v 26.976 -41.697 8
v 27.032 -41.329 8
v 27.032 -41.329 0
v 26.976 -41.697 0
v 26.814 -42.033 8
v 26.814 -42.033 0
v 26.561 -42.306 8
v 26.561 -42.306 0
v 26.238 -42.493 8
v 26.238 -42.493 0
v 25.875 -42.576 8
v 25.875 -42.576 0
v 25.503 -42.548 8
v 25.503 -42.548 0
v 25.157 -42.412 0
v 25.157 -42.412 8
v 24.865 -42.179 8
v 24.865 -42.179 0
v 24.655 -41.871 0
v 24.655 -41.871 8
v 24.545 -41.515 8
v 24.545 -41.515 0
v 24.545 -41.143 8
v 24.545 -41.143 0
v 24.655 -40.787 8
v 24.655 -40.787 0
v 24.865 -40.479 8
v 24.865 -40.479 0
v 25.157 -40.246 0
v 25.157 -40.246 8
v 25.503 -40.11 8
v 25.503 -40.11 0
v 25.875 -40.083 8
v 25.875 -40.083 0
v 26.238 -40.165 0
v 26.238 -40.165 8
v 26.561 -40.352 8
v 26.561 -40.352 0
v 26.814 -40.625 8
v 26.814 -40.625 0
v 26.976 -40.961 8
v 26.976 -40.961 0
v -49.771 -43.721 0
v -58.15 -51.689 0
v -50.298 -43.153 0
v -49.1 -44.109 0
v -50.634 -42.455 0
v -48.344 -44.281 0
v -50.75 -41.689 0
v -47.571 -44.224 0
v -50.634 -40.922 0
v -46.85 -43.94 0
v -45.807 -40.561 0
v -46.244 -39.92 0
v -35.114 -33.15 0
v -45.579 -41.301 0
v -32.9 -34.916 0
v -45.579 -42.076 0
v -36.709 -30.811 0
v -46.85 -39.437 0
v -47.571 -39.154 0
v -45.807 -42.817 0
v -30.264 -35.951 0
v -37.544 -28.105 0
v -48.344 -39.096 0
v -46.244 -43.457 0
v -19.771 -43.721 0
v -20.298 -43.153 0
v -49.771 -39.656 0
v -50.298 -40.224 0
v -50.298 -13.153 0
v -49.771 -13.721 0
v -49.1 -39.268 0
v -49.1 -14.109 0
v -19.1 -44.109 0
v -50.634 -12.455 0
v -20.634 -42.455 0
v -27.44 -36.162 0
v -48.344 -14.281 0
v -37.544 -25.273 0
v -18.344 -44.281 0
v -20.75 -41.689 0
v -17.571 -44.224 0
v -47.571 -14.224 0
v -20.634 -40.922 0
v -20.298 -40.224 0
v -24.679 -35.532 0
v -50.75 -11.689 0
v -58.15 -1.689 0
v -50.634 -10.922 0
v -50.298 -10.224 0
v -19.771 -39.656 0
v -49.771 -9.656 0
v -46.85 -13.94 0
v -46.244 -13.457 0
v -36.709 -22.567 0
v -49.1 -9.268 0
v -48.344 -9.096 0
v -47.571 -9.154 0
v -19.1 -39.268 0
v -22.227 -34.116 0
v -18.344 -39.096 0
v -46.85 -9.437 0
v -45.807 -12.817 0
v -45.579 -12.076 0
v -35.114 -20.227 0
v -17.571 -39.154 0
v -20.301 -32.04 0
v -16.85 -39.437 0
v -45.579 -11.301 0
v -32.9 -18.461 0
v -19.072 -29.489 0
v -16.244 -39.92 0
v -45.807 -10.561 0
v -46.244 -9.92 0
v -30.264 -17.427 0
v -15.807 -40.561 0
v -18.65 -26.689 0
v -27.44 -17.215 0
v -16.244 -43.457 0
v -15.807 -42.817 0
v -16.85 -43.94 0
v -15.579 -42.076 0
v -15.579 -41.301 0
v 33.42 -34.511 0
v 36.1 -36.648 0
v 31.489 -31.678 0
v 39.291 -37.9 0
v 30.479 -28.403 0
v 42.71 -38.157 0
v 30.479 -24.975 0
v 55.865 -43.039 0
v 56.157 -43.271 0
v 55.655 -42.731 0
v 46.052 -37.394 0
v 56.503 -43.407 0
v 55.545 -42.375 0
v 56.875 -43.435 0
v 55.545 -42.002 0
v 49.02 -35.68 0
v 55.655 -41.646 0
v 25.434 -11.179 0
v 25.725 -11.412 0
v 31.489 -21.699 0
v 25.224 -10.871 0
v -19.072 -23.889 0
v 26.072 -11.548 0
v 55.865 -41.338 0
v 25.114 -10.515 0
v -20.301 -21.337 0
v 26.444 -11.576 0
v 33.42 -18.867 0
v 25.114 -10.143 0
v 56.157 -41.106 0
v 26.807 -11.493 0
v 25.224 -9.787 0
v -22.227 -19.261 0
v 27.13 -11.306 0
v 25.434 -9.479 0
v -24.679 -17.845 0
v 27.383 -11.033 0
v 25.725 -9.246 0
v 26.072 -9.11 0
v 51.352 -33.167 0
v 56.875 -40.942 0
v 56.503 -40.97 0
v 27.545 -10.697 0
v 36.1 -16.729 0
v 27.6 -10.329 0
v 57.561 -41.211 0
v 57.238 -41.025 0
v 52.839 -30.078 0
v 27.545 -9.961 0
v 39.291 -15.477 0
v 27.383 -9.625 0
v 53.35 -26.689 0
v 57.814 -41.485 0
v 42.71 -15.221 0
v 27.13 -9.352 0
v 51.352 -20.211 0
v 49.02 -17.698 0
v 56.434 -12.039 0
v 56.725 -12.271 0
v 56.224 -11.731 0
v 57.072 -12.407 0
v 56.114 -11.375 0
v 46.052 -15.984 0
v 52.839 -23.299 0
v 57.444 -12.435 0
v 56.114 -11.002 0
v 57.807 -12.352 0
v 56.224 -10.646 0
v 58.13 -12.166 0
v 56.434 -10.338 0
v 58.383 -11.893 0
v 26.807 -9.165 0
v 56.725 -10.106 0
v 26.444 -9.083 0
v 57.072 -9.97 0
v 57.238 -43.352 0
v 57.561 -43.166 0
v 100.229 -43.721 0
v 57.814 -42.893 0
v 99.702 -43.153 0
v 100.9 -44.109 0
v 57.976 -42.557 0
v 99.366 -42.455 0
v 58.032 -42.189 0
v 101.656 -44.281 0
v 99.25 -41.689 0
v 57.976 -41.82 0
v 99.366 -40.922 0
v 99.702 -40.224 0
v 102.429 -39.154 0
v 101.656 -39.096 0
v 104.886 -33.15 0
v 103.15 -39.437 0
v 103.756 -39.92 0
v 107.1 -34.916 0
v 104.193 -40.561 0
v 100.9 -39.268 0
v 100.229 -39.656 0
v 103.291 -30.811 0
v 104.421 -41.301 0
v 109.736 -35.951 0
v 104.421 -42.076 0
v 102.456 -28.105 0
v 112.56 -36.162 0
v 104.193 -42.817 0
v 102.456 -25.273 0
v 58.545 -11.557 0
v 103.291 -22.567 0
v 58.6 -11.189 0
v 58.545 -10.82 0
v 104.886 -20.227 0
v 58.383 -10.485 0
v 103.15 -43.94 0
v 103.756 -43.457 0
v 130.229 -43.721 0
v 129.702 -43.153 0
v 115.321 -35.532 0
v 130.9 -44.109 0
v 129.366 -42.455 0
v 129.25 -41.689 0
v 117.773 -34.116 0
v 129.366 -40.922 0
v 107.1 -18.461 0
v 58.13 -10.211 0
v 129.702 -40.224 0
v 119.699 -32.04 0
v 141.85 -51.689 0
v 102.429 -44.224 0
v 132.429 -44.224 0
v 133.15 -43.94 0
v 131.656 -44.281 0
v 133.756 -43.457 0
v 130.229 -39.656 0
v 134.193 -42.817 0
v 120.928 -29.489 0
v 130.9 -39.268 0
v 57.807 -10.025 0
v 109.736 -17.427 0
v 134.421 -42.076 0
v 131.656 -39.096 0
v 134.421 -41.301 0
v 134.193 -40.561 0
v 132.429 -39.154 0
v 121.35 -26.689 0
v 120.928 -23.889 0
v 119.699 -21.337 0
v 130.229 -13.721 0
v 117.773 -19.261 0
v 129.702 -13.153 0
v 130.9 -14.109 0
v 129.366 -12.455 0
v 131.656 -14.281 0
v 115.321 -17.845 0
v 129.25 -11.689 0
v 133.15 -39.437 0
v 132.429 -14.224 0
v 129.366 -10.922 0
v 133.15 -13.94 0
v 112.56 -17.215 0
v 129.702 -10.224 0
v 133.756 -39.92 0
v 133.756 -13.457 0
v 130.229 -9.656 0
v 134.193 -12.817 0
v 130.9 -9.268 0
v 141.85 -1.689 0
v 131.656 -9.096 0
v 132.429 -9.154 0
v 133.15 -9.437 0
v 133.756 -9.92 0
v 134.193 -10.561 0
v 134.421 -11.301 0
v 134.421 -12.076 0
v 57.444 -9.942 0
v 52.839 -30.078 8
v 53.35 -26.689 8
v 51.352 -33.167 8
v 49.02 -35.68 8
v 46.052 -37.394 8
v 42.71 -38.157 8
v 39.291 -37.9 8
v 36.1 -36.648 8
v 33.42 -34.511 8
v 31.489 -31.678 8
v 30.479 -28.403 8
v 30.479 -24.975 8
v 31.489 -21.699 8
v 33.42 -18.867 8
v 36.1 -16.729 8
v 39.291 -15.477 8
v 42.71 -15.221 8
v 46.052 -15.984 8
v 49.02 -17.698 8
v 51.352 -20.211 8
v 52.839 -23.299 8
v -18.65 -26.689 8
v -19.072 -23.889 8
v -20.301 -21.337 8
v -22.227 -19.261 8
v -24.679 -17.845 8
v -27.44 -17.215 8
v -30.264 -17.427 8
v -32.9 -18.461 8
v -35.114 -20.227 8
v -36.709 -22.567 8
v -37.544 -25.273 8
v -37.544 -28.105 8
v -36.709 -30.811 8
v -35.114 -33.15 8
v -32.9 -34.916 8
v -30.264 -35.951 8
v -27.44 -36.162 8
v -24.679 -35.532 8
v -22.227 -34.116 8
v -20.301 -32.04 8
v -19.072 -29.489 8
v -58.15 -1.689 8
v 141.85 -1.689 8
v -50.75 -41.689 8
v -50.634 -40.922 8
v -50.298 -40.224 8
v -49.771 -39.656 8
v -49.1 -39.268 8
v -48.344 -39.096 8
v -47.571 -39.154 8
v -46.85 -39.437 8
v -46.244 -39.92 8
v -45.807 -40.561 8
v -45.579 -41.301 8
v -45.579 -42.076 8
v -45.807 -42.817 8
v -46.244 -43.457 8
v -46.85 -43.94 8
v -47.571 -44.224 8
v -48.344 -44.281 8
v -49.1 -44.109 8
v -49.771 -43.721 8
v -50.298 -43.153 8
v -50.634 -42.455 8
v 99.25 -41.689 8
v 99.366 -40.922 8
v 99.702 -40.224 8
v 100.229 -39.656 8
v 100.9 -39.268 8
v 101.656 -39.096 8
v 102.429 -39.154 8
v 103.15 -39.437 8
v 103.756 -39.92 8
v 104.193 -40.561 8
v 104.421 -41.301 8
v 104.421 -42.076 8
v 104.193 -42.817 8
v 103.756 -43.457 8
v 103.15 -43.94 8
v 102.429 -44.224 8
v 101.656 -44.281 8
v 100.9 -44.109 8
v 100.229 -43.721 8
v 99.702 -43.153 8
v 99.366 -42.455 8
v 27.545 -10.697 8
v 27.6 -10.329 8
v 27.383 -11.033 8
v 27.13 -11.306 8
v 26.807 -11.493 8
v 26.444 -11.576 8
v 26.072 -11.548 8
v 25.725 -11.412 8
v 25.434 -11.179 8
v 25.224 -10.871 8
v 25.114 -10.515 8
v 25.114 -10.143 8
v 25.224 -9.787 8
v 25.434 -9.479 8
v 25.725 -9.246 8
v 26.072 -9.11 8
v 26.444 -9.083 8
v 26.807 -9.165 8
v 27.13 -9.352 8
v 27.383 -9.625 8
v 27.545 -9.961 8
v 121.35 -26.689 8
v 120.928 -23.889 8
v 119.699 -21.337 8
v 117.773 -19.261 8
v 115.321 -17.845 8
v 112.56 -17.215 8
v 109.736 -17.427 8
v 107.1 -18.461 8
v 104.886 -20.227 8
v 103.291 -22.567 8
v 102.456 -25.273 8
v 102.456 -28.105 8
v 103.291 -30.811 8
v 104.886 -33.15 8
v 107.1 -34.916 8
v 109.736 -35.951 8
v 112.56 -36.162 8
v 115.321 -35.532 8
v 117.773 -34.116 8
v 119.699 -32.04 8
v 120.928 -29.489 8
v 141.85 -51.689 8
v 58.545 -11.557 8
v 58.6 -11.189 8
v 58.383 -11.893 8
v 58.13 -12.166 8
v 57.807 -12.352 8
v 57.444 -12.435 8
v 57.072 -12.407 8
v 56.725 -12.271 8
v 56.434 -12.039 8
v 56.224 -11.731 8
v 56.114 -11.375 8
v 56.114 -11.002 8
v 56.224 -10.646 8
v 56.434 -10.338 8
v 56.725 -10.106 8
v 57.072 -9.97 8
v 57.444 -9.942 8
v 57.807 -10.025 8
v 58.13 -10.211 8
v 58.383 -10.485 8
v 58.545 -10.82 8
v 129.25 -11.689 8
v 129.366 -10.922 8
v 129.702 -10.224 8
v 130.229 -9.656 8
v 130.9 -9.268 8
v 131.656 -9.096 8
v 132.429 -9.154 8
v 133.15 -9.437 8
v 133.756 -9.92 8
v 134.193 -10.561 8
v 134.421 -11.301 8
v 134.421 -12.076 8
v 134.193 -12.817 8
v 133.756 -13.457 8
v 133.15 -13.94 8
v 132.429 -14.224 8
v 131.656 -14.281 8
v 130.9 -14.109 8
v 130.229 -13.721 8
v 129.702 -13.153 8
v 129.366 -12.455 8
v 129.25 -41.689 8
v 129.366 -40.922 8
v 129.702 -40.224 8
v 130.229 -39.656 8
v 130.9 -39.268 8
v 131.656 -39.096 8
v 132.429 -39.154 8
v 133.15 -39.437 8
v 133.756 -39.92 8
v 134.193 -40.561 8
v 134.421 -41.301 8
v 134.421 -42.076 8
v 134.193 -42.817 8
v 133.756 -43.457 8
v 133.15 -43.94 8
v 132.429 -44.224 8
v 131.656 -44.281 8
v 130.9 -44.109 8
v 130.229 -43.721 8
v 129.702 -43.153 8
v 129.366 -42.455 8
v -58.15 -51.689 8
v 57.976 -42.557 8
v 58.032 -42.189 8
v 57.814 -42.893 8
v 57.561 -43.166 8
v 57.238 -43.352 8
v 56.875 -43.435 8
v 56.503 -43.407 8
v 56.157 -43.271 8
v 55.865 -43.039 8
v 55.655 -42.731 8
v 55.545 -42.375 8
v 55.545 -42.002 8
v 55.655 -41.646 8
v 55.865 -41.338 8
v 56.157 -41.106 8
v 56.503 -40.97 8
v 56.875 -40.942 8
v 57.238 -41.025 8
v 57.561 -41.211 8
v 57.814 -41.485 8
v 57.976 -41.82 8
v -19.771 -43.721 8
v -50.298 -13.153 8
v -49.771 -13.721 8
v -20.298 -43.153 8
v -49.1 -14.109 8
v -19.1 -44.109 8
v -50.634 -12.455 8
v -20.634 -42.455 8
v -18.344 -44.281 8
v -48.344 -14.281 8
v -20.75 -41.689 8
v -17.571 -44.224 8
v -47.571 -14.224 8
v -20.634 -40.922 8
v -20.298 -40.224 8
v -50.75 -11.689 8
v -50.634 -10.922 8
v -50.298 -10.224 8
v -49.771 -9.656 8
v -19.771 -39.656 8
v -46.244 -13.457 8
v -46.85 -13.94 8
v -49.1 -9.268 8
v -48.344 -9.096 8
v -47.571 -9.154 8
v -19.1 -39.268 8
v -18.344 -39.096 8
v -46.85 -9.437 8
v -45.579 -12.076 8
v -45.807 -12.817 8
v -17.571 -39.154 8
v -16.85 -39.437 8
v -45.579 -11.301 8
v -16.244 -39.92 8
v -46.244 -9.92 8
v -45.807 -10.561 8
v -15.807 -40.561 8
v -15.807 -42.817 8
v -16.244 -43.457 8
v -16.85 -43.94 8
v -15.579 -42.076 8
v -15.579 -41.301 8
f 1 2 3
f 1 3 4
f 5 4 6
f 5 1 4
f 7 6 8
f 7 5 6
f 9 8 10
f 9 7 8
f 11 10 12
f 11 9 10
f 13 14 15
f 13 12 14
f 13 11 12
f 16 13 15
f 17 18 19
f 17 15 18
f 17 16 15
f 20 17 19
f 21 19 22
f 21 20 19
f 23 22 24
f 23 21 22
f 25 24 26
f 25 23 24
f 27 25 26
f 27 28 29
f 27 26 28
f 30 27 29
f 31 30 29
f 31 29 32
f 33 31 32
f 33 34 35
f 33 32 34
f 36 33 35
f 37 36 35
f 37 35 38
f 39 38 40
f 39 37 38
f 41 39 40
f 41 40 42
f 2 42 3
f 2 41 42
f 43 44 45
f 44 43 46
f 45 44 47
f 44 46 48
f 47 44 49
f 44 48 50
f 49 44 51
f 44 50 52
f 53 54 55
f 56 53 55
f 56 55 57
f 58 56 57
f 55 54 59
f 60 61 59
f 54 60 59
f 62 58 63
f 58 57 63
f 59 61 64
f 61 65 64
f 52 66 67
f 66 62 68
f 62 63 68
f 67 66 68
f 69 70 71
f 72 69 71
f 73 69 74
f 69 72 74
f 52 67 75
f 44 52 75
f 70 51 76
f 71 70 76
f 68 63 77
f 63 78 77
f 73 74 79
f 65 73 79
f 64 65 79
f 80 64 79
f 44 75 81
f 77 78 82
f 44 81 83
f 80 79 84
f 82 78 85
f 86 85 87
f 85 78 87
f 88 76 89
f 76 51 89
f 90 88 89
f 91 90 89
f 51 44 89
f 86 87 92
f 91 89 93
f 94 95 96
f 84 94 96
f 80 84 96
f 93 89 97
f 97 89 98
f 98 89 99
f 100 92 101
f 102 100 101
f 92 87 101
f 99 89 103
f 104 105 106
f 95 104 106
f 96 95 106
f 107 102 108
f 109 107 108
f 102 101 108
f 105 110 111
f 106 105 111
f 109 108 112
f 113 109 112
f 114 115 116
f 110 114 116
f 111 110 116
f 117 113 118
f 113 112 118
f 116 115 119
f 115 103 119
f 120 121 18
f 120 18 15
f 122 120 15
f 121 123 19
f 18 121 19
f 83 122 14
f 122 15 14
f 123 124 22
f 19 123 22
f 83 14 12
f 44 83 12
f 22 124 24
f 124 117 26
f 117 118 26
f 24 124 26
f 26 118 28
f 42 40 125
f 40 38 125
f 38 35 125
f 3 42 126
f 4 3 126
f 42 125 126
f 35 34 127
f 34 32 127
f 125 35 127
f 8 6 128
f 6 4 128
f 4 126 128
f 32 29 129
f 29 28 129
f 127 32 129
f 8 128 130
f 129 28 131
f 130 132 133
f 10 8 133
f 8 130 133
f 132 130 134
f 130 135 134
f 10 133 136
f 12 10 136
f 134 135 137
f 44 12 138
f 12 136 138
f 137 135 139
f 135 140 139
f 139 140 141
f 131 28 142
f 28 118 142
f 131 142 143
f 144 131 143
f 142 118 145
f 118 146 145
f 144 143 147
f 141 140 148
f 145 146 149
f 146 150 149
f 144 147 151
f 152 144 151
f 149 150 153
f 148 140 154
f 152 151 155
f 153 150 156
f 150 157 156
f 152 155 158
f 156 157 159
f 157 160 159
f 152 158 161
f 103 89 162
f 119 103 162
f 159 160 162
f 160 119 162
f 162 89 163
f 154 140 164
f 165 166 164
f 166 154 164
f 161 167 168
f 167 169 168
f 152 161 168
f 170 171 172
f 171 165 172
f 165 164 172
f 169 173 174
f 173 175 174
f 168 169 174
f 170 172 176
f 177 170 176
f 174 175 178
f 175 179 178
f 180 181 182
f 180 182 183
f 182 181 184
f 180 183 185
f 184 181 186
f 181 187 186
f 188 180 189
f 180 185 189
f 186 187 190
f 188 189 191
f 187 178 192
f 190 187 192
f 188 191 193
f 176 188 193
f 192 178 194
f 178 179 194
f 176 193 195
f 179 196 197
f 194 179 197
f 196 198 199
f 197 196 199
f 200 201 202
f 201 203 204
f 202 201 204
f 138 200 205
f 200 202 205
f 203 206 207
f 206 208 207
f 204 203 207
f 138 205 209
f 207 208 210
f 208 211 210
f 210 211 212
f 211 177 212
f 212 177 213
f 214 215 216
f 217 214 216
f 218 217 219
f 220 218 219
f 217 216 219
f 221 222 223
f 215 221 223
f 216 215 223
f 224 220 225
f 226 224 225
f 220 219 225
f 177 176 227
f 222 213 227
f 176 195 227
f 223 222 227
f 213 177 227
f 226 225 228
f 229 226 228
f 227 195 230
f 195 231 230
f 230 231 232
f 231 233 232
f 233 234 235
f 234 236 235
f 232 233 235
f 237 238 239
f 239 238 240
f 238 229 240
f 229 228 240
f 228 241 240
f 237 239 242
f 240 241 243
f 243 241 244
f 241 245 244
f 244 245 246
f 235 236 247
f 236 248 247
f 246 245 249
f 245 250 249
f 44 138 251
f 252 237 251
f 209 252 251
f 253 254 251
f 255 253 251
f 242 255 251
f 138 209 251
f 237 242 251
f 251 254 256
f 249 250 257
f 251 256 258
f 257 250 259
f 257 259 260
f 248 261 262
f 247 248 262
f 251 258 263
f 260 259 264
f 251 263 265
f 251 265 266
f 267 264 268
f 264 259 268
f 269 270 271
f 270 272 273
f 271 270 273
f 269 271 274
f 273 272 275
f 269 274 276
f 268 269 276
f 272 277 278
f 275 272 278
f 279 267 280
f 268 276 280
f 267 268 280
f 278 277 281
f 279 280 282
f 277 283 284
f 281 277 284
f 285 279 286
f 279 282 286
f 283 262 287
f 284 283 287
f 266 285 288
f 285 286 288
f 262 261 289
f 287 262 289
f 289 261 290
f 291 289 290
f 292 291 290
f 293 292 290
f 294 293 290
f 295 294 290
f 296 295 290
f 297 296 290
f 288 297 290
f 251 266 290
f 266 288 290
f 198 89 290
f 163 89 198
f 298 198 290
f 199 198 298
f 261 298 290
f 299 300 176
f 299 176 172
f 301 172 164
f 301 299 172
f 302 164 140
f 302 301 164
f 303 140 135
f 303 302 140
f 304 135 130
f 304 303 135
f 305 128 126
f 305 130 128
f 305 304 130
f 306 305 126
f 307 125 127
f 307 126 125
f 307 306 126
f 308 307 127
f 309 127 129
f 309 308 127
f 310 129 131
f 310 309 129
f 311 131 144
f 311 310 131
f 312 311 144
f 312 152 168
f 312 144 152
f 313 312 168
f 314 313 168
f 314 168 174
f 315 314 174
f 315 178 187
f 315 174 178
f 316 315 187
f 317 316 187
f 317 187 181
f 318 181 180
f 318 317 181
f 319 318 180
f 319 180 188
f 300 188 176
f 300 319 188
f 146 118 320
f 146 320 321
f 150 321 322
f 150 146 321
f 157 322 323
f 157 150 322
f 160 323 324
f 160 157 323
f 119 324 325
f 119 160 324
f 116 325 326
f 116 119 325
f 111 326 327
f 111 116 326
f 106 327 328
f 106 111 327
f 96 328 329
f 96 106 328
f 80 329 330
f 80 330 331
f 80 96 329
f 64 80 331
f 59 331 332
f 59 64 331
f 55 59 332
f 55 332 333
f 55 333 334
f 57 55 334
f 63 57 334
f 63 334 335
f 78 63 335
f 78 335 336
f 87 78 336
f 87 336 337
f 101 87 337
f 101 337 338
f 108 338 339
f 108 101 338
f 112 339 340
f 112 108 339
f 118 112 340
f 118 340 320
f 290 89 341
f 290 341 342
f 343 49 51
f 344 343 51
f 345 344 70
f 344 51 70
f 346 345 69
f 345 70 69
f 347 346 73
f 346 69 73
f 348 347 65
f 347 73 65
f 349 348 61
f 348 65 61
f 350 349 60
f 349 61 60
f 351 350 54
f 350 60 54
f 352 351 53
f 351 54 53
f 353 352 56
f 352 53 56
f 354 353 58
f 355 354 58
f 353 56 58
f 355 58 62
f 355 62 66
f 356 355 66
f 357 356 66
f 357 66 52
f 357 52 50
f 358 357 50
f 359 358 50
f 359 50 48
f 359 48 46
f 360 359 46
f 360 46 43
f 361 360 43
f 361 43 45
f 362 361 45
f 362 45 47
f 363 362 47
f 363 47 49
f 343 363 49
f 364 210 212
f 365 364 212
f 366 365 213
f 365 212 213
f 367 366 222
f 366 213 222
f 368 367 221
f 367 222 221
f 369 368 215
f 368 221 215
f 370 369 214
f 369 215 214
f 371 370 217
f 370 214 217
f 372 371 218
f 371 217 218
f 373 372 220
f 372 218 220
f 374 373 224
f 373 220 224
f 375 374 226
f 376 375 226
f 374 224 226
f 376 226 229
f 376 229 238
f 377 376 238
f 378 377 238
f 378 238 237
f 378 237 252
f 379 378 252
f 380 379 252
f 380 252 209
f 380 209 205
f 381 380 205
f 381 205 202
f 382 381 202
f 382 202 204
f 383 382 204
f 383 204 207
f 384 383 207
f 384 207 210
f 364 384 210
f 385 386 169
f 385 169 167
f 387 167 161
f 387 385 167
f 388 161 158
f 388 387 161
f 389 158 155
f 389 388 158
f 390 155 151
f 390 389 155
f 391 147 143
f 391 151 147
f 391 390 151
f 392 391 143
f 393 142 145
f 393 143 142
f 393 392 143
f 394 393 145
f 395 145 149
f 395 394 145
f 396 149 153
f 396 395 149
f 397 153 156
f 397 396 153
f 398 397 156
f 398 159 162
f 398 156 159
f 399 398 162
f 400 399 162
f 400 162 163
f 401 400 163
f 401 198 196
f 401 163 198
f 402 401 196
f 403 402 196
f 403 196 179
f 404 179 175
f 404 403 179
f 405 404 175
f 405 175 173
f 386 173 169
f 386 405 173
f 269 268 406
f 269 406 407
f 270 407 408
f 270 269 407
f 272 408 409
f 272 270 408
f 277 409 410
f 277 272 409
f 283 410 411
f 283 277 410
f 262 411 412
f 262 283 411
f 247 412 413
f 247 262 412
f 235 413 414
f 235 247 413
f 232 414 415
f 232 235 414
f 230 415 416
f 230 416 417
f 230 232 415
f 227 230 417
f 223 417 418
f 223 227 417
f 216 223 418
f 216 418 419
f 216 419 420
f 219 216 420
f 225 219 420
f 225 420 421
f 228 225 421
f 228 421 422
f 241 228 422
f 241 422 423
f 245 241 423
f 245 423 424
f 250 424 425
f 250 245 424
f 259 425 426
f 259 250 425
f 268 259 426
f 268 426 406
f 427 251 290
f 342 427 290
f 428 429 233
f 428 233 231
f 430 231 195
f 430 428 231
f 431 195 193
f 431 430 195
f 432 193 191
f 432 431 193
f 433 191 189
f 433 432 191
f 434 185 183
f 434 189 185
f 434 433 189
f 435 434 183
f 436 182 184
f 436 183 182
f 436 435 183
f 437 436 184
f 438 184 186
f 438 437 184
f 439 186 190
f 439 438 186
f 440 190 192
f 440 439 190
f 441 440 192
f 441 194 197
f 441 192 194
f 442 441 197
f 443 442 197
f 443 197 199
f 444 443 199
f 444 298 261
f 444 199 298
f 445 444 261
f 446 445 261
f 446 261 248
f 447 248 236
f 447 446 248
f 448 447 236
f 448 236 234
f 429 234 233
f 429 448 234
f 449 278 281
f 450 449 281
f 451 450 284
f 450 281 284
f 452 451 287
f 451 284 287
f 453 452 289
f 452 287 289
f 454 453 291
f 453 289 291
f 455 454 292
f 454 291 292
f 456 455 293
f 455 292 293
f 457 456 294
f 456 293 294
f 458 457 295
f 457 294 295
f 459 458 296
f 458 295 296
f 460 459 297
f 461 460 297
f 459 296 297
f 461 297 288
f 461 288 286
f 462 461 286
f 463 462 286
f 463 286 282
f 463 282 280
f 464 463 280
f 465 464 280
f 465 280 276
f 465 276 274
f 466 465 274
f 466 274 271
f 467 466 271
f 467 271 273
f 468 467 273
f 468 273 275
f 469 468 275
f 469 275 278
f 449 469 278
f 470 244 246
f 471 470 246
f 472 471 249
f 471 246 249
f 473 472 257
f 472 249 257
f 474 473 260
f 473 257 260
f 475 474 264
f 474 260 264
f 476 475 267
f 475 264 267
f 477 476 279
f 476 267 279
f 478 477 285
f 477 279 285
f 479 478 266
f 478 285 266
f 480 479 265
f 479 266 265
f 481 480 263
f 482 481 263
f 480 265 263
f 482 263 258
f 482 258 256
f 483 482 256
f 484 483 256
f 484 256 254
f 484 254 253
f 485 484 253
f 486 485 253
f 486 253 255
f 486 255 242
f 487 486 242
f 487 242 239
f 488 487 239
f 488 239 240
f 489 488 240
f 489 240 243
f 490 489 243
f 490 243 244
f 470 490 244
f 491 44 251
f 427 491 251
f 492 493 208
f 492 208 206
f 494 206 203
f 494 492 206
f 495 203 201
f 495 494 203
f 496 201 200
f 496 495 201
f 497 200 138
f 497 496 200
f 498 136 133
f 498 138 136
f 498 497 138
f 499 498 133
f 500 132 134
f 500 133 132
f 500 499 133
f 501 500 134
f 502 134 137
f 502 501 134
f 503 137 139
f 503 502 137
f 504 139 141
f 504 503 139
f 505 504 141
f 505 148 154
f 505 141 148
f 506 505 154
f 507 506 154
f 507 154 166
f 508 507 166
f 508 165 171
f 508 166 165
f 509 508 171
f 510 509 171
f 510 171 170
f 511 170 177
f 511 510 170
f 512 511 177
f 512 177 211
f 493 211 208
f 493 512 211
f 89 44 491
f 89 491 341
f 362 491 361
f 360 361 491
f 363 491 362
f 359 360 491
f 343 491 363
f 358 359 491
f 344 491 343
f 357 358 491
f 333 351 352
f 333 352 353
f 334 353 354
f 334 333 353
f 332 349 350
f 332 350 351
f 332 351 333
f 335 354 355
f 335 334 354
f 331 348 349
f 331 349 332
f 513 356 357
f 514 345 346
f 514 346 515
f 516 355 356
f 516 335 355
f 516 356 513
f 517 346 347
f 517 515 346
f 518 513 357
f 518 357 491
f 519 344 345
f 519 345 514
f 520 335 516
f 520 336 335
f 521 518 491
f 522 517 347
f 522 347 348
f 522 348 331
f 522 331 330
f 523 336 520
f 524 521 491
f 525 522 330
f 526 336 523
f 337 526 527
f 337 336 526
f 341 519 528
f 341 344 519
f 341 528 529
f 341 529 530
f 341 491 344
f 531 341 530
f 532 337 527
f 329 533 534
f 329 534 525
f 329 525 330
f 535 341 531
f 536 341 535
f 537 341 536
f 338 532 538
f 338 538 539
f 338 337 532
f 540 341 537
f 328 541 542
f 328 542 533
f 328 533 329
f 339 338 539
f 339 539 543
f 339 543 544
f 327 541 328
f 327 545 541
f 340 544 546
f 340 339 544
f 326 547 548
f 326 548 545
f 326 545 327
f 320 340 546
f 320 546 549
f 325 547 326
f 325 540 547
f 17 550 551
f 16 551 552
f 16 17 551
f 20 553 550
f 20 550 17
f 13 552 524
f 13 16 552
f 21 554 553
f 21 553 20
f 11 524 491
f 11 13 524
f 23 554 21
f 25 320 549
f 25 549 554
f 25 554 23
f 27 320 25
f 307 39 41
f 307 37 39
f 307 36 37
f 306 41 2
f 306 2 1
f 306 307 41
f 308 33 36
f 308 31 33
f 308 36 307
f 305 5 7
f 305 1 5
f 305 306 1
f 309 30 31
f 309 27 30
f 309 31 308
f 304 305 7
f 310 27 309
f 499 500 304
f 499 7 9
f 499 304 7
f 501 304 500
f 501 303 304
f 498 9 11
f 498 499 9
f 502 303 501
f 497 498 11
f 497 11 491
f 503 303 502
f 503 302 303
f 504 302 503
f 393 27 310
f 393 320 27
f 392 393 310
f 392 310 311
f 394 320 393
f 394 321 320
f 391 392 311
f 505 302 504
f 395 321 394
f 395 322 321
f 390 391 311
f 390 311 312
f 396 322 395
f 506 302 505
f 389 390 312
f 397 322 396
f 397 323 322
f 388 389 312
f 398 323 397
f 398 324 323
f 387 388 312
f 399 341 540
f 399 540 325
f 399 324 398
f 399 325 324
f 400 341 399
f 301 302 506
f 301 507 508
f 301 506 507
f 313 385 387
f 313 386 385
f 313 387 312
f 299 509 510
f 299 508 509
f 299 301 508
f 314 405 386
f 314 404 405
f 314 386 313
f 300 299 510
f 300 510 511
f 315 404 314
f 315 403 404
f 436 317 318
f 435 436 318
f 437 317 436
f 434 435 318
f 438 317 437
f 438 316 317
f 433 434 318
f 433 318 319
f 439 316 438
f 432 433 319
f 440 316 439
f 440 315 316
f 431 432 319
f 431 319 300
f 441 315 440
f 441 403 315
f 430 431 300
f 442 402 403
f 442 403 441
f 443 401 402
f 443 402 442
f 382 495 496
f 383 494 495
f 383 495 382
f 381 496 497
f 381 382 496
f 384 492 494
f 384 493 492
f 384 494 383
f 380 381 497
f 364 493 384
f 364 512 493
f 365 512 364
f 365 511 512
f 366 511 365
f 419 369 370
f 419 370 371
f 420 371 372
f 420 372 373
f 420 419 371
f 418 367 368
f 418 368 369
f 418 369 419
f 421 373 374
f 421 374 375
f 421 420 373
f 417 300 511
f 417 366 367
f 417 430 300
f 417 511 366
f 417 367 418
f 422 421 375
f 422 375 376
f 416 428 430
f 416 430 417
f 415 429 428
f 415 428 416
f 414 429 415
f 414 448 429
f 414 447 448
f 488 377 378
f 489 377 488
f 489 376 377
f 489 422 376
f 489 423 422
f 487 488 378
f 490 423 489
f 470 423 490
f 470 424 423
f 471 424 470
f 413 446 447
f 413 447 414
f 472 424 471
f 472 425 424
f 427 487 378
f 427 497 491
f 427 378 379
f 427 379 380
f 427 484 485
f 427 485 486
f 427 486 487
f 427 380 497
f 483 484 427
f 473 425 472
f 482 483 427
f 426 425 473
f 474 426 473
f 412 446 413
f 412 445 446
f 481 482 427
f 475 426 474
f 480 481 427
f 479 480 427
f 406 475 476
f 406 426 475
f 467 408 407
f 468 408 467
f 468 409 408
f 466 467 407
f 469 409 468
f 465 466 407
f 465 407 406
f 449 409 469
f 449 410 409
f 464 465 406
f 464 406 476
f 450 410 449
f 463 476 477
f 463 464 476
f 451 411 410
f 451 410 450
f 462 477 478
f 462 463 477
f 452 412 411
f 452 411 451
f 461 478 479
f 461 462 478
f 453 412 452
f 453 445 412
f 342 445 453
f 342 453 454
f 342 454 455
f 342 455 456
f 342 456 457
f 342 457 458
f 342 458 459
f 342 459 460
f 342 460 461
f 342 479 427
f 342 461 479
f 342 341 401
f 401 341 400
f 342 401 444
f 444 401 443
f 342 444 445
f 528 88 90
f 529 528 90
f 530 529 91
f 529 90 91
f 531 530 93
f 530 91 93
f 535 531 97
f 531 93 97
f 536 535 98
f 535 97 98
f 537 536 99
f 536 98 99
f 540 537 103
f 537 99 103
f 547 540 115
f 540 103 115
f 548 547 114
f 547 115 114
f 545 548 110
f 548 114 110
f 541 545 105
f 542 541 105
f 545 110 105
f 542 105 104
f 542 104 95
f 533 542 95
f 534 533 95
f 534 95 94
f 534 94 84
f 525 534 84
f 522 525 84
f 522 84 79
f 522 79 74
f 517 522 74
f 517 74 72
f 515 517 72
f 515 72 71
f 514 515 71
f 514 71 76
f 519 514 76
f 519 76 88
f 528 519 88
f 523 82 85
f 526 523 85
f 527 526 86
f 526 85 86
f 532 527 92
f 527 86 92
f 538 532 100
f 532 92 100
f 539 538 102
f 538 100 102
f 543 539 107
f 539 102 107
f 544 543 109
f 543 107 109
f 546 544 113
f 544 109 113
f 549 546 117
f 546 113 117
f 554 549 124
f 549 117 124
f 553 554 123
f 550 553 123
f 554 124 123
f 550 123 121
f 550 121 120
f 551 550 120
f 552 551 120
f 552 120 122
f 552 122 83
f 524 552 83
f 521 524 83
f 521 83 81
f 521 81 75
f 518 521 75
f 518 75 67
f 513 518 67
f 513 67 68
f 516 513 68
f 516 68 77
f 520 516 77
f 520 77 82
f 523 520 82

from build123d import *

# Parameters (mm, degrees)
IZIM1_W                              = 100
IZIM1_H                              = 50
IZIM1_R                              = 2.476303865
IZIM1_R_2                            = 9.5
IZIM1_R_3                            = 2.283039358
Y_KSEKLIK_EKSTR_ZYON1_DEPTH          = 8
M5_HELISARMAL_I_IN_Z_VANA_MATKAB_1_D = 5.2
KES_EKSTR_ZYON1_DEPTH                = 10
KES_EKSTR_ZYON1_DEPTH_BACK           = 10
IZIM4_R                              = 11.5
IZIM4_R_2                            = 1.25
M5_HELISARMAL_I_IN_Z_VANA_MATKAB_2_D = 5.2


with BuildPart() as part:
    # Çizim1 → Yükseklik-Ekstrüzyon1 (new body)
    # profile 1 of 6: a face of its own
    with BuildSketch(Plane.XY):
        with Locations((91.850220264, -26.688693098)):
            Rectangle(IZIM1_W, IZIM1_H)
        with Locations((131.850220264, -41.688693098)):
            Circle(IZIM1_R, mode=Mode.SUBTRACT)
        with Locations((111.850220264, -26.688693098)):
            Circle(IZIM1_R_2, mode=Mode.SUBTRACT)
        with Locations((131.850220264, -11.688693098)):
            Circle(IZIM1_R_3, mode=Mode.SUBTRACT)
    # profile 2 of 6: a face of its own
    with BuildSketch(Plane.XY):
        with Locations((-8.149779736, -26.688693098)):
            Rectangle(IZIM1_W, IZIM1_H)
        with Locations((-48.149779736, -41.688693098)):
            Circle(IZIM1_R, mode=Mode.SUBTRACT)
        with Locations((-28.149779736, -26.688693098)):
            Circle(IZIM1_R_2, mode=Mode.SUBTRACT)
        with Locations((-48.149779736, -11.688693098)):
            Circle(IZIM1_R_3, mode=Mode.SUBTRACT)
    # profile 3 of 6: a face of its own
    with BuildSketch(Plane.XY):
        with Locations((-48.149779736, -11.688693098)):
            Circle(IZIM1_R_3)
    # profile 4 of 6: a face of its own
    with BuildSketch(Plane.XY):
        with Locations((-48.149779736, -41.688693098)):
            Circle(IZIM1_R)
    # profile 5 of 6: a face of its own
    with BuildSketch(Plane.XY):
        with Locations((131.850220264, -11.688693098)):
            Circle(IZIM1_R_3)
    # profile 6 of 6: a face of its own
    with BuildSketch(Plane.XY):
        with Locations((131.850220264, -41.688693098)):
            Circle(IZIM1_R)
    extrude(amount=Y_KSEKLIK_EKSTR_ZYON1_DEPTH)

    # M5 Helisarmal için Zıvana matkabı1 (through all)
    with Locations(Plane.XY.offset(8)):
        with Locations((-48.149779736, -11.688693098), (-48.149779736, -41.688693098), (131.850220264, -41.688693098), (131.850220264, -11.688693098)):
            Hole(M5_HELISARMAL_I_IN_Z_VANA_MATKAB_1_D / 2)

    # Çizim4 → Kes-Ekstrüzyon1 (cut, two sides: drawn at the far end of the back side and taken through both)
    with BuildSketch(Plane(origin=(0, 0, 0), x_dir=(-1, 0, 0), z_dir=(0, 0, -1)).offset(-KES_EKSTR_ZYON1_DEPTH_BACK)):
        with Locations(Location((-41.850220264, -26.688693098, 0), (0, 0, 180))):
            Circle(IZIM4_R)
        with Locations(Location((-57.350220264, -11.188693098, 0), (0, 0, 180))):
            Circle(IZIM4_R_2)
        with Locations(Location((-56.781535146, -42.188693098, 0), (0, 0, 180))):
            Circle(IZIM4_R_2)
        with Locations(Location((-25.781535146, -41.329010258, 0), (0, 0, 180))):
            Circle(IZIM4_R_2)
        with Locations(Location((-26.350220264, -10.329010258, 0), (0, 0, 180))):
            Circle(IZIM4_R_2)
    extrude(amount=KES_EKSTR_ZYON1_DEPTH + KES_EKSTR_ZYON1_DEPTH_BACK, mode=Mode.SUBTRACT)

    # M5 Helisarmal için Zıvana matkabı2 (through all)
    with Locations(Plane(origin=(-18.149779736, -41.688693098, 8), x_dir=(1, 0, 0), z_dir=(0, 0, 1))):
        with Locations((0, 0), (120, 0)):
            Hole(M5_HELISARMAL_I_IN_Z_VANA_MATKAB_2_D / 2)


solid = part.part
